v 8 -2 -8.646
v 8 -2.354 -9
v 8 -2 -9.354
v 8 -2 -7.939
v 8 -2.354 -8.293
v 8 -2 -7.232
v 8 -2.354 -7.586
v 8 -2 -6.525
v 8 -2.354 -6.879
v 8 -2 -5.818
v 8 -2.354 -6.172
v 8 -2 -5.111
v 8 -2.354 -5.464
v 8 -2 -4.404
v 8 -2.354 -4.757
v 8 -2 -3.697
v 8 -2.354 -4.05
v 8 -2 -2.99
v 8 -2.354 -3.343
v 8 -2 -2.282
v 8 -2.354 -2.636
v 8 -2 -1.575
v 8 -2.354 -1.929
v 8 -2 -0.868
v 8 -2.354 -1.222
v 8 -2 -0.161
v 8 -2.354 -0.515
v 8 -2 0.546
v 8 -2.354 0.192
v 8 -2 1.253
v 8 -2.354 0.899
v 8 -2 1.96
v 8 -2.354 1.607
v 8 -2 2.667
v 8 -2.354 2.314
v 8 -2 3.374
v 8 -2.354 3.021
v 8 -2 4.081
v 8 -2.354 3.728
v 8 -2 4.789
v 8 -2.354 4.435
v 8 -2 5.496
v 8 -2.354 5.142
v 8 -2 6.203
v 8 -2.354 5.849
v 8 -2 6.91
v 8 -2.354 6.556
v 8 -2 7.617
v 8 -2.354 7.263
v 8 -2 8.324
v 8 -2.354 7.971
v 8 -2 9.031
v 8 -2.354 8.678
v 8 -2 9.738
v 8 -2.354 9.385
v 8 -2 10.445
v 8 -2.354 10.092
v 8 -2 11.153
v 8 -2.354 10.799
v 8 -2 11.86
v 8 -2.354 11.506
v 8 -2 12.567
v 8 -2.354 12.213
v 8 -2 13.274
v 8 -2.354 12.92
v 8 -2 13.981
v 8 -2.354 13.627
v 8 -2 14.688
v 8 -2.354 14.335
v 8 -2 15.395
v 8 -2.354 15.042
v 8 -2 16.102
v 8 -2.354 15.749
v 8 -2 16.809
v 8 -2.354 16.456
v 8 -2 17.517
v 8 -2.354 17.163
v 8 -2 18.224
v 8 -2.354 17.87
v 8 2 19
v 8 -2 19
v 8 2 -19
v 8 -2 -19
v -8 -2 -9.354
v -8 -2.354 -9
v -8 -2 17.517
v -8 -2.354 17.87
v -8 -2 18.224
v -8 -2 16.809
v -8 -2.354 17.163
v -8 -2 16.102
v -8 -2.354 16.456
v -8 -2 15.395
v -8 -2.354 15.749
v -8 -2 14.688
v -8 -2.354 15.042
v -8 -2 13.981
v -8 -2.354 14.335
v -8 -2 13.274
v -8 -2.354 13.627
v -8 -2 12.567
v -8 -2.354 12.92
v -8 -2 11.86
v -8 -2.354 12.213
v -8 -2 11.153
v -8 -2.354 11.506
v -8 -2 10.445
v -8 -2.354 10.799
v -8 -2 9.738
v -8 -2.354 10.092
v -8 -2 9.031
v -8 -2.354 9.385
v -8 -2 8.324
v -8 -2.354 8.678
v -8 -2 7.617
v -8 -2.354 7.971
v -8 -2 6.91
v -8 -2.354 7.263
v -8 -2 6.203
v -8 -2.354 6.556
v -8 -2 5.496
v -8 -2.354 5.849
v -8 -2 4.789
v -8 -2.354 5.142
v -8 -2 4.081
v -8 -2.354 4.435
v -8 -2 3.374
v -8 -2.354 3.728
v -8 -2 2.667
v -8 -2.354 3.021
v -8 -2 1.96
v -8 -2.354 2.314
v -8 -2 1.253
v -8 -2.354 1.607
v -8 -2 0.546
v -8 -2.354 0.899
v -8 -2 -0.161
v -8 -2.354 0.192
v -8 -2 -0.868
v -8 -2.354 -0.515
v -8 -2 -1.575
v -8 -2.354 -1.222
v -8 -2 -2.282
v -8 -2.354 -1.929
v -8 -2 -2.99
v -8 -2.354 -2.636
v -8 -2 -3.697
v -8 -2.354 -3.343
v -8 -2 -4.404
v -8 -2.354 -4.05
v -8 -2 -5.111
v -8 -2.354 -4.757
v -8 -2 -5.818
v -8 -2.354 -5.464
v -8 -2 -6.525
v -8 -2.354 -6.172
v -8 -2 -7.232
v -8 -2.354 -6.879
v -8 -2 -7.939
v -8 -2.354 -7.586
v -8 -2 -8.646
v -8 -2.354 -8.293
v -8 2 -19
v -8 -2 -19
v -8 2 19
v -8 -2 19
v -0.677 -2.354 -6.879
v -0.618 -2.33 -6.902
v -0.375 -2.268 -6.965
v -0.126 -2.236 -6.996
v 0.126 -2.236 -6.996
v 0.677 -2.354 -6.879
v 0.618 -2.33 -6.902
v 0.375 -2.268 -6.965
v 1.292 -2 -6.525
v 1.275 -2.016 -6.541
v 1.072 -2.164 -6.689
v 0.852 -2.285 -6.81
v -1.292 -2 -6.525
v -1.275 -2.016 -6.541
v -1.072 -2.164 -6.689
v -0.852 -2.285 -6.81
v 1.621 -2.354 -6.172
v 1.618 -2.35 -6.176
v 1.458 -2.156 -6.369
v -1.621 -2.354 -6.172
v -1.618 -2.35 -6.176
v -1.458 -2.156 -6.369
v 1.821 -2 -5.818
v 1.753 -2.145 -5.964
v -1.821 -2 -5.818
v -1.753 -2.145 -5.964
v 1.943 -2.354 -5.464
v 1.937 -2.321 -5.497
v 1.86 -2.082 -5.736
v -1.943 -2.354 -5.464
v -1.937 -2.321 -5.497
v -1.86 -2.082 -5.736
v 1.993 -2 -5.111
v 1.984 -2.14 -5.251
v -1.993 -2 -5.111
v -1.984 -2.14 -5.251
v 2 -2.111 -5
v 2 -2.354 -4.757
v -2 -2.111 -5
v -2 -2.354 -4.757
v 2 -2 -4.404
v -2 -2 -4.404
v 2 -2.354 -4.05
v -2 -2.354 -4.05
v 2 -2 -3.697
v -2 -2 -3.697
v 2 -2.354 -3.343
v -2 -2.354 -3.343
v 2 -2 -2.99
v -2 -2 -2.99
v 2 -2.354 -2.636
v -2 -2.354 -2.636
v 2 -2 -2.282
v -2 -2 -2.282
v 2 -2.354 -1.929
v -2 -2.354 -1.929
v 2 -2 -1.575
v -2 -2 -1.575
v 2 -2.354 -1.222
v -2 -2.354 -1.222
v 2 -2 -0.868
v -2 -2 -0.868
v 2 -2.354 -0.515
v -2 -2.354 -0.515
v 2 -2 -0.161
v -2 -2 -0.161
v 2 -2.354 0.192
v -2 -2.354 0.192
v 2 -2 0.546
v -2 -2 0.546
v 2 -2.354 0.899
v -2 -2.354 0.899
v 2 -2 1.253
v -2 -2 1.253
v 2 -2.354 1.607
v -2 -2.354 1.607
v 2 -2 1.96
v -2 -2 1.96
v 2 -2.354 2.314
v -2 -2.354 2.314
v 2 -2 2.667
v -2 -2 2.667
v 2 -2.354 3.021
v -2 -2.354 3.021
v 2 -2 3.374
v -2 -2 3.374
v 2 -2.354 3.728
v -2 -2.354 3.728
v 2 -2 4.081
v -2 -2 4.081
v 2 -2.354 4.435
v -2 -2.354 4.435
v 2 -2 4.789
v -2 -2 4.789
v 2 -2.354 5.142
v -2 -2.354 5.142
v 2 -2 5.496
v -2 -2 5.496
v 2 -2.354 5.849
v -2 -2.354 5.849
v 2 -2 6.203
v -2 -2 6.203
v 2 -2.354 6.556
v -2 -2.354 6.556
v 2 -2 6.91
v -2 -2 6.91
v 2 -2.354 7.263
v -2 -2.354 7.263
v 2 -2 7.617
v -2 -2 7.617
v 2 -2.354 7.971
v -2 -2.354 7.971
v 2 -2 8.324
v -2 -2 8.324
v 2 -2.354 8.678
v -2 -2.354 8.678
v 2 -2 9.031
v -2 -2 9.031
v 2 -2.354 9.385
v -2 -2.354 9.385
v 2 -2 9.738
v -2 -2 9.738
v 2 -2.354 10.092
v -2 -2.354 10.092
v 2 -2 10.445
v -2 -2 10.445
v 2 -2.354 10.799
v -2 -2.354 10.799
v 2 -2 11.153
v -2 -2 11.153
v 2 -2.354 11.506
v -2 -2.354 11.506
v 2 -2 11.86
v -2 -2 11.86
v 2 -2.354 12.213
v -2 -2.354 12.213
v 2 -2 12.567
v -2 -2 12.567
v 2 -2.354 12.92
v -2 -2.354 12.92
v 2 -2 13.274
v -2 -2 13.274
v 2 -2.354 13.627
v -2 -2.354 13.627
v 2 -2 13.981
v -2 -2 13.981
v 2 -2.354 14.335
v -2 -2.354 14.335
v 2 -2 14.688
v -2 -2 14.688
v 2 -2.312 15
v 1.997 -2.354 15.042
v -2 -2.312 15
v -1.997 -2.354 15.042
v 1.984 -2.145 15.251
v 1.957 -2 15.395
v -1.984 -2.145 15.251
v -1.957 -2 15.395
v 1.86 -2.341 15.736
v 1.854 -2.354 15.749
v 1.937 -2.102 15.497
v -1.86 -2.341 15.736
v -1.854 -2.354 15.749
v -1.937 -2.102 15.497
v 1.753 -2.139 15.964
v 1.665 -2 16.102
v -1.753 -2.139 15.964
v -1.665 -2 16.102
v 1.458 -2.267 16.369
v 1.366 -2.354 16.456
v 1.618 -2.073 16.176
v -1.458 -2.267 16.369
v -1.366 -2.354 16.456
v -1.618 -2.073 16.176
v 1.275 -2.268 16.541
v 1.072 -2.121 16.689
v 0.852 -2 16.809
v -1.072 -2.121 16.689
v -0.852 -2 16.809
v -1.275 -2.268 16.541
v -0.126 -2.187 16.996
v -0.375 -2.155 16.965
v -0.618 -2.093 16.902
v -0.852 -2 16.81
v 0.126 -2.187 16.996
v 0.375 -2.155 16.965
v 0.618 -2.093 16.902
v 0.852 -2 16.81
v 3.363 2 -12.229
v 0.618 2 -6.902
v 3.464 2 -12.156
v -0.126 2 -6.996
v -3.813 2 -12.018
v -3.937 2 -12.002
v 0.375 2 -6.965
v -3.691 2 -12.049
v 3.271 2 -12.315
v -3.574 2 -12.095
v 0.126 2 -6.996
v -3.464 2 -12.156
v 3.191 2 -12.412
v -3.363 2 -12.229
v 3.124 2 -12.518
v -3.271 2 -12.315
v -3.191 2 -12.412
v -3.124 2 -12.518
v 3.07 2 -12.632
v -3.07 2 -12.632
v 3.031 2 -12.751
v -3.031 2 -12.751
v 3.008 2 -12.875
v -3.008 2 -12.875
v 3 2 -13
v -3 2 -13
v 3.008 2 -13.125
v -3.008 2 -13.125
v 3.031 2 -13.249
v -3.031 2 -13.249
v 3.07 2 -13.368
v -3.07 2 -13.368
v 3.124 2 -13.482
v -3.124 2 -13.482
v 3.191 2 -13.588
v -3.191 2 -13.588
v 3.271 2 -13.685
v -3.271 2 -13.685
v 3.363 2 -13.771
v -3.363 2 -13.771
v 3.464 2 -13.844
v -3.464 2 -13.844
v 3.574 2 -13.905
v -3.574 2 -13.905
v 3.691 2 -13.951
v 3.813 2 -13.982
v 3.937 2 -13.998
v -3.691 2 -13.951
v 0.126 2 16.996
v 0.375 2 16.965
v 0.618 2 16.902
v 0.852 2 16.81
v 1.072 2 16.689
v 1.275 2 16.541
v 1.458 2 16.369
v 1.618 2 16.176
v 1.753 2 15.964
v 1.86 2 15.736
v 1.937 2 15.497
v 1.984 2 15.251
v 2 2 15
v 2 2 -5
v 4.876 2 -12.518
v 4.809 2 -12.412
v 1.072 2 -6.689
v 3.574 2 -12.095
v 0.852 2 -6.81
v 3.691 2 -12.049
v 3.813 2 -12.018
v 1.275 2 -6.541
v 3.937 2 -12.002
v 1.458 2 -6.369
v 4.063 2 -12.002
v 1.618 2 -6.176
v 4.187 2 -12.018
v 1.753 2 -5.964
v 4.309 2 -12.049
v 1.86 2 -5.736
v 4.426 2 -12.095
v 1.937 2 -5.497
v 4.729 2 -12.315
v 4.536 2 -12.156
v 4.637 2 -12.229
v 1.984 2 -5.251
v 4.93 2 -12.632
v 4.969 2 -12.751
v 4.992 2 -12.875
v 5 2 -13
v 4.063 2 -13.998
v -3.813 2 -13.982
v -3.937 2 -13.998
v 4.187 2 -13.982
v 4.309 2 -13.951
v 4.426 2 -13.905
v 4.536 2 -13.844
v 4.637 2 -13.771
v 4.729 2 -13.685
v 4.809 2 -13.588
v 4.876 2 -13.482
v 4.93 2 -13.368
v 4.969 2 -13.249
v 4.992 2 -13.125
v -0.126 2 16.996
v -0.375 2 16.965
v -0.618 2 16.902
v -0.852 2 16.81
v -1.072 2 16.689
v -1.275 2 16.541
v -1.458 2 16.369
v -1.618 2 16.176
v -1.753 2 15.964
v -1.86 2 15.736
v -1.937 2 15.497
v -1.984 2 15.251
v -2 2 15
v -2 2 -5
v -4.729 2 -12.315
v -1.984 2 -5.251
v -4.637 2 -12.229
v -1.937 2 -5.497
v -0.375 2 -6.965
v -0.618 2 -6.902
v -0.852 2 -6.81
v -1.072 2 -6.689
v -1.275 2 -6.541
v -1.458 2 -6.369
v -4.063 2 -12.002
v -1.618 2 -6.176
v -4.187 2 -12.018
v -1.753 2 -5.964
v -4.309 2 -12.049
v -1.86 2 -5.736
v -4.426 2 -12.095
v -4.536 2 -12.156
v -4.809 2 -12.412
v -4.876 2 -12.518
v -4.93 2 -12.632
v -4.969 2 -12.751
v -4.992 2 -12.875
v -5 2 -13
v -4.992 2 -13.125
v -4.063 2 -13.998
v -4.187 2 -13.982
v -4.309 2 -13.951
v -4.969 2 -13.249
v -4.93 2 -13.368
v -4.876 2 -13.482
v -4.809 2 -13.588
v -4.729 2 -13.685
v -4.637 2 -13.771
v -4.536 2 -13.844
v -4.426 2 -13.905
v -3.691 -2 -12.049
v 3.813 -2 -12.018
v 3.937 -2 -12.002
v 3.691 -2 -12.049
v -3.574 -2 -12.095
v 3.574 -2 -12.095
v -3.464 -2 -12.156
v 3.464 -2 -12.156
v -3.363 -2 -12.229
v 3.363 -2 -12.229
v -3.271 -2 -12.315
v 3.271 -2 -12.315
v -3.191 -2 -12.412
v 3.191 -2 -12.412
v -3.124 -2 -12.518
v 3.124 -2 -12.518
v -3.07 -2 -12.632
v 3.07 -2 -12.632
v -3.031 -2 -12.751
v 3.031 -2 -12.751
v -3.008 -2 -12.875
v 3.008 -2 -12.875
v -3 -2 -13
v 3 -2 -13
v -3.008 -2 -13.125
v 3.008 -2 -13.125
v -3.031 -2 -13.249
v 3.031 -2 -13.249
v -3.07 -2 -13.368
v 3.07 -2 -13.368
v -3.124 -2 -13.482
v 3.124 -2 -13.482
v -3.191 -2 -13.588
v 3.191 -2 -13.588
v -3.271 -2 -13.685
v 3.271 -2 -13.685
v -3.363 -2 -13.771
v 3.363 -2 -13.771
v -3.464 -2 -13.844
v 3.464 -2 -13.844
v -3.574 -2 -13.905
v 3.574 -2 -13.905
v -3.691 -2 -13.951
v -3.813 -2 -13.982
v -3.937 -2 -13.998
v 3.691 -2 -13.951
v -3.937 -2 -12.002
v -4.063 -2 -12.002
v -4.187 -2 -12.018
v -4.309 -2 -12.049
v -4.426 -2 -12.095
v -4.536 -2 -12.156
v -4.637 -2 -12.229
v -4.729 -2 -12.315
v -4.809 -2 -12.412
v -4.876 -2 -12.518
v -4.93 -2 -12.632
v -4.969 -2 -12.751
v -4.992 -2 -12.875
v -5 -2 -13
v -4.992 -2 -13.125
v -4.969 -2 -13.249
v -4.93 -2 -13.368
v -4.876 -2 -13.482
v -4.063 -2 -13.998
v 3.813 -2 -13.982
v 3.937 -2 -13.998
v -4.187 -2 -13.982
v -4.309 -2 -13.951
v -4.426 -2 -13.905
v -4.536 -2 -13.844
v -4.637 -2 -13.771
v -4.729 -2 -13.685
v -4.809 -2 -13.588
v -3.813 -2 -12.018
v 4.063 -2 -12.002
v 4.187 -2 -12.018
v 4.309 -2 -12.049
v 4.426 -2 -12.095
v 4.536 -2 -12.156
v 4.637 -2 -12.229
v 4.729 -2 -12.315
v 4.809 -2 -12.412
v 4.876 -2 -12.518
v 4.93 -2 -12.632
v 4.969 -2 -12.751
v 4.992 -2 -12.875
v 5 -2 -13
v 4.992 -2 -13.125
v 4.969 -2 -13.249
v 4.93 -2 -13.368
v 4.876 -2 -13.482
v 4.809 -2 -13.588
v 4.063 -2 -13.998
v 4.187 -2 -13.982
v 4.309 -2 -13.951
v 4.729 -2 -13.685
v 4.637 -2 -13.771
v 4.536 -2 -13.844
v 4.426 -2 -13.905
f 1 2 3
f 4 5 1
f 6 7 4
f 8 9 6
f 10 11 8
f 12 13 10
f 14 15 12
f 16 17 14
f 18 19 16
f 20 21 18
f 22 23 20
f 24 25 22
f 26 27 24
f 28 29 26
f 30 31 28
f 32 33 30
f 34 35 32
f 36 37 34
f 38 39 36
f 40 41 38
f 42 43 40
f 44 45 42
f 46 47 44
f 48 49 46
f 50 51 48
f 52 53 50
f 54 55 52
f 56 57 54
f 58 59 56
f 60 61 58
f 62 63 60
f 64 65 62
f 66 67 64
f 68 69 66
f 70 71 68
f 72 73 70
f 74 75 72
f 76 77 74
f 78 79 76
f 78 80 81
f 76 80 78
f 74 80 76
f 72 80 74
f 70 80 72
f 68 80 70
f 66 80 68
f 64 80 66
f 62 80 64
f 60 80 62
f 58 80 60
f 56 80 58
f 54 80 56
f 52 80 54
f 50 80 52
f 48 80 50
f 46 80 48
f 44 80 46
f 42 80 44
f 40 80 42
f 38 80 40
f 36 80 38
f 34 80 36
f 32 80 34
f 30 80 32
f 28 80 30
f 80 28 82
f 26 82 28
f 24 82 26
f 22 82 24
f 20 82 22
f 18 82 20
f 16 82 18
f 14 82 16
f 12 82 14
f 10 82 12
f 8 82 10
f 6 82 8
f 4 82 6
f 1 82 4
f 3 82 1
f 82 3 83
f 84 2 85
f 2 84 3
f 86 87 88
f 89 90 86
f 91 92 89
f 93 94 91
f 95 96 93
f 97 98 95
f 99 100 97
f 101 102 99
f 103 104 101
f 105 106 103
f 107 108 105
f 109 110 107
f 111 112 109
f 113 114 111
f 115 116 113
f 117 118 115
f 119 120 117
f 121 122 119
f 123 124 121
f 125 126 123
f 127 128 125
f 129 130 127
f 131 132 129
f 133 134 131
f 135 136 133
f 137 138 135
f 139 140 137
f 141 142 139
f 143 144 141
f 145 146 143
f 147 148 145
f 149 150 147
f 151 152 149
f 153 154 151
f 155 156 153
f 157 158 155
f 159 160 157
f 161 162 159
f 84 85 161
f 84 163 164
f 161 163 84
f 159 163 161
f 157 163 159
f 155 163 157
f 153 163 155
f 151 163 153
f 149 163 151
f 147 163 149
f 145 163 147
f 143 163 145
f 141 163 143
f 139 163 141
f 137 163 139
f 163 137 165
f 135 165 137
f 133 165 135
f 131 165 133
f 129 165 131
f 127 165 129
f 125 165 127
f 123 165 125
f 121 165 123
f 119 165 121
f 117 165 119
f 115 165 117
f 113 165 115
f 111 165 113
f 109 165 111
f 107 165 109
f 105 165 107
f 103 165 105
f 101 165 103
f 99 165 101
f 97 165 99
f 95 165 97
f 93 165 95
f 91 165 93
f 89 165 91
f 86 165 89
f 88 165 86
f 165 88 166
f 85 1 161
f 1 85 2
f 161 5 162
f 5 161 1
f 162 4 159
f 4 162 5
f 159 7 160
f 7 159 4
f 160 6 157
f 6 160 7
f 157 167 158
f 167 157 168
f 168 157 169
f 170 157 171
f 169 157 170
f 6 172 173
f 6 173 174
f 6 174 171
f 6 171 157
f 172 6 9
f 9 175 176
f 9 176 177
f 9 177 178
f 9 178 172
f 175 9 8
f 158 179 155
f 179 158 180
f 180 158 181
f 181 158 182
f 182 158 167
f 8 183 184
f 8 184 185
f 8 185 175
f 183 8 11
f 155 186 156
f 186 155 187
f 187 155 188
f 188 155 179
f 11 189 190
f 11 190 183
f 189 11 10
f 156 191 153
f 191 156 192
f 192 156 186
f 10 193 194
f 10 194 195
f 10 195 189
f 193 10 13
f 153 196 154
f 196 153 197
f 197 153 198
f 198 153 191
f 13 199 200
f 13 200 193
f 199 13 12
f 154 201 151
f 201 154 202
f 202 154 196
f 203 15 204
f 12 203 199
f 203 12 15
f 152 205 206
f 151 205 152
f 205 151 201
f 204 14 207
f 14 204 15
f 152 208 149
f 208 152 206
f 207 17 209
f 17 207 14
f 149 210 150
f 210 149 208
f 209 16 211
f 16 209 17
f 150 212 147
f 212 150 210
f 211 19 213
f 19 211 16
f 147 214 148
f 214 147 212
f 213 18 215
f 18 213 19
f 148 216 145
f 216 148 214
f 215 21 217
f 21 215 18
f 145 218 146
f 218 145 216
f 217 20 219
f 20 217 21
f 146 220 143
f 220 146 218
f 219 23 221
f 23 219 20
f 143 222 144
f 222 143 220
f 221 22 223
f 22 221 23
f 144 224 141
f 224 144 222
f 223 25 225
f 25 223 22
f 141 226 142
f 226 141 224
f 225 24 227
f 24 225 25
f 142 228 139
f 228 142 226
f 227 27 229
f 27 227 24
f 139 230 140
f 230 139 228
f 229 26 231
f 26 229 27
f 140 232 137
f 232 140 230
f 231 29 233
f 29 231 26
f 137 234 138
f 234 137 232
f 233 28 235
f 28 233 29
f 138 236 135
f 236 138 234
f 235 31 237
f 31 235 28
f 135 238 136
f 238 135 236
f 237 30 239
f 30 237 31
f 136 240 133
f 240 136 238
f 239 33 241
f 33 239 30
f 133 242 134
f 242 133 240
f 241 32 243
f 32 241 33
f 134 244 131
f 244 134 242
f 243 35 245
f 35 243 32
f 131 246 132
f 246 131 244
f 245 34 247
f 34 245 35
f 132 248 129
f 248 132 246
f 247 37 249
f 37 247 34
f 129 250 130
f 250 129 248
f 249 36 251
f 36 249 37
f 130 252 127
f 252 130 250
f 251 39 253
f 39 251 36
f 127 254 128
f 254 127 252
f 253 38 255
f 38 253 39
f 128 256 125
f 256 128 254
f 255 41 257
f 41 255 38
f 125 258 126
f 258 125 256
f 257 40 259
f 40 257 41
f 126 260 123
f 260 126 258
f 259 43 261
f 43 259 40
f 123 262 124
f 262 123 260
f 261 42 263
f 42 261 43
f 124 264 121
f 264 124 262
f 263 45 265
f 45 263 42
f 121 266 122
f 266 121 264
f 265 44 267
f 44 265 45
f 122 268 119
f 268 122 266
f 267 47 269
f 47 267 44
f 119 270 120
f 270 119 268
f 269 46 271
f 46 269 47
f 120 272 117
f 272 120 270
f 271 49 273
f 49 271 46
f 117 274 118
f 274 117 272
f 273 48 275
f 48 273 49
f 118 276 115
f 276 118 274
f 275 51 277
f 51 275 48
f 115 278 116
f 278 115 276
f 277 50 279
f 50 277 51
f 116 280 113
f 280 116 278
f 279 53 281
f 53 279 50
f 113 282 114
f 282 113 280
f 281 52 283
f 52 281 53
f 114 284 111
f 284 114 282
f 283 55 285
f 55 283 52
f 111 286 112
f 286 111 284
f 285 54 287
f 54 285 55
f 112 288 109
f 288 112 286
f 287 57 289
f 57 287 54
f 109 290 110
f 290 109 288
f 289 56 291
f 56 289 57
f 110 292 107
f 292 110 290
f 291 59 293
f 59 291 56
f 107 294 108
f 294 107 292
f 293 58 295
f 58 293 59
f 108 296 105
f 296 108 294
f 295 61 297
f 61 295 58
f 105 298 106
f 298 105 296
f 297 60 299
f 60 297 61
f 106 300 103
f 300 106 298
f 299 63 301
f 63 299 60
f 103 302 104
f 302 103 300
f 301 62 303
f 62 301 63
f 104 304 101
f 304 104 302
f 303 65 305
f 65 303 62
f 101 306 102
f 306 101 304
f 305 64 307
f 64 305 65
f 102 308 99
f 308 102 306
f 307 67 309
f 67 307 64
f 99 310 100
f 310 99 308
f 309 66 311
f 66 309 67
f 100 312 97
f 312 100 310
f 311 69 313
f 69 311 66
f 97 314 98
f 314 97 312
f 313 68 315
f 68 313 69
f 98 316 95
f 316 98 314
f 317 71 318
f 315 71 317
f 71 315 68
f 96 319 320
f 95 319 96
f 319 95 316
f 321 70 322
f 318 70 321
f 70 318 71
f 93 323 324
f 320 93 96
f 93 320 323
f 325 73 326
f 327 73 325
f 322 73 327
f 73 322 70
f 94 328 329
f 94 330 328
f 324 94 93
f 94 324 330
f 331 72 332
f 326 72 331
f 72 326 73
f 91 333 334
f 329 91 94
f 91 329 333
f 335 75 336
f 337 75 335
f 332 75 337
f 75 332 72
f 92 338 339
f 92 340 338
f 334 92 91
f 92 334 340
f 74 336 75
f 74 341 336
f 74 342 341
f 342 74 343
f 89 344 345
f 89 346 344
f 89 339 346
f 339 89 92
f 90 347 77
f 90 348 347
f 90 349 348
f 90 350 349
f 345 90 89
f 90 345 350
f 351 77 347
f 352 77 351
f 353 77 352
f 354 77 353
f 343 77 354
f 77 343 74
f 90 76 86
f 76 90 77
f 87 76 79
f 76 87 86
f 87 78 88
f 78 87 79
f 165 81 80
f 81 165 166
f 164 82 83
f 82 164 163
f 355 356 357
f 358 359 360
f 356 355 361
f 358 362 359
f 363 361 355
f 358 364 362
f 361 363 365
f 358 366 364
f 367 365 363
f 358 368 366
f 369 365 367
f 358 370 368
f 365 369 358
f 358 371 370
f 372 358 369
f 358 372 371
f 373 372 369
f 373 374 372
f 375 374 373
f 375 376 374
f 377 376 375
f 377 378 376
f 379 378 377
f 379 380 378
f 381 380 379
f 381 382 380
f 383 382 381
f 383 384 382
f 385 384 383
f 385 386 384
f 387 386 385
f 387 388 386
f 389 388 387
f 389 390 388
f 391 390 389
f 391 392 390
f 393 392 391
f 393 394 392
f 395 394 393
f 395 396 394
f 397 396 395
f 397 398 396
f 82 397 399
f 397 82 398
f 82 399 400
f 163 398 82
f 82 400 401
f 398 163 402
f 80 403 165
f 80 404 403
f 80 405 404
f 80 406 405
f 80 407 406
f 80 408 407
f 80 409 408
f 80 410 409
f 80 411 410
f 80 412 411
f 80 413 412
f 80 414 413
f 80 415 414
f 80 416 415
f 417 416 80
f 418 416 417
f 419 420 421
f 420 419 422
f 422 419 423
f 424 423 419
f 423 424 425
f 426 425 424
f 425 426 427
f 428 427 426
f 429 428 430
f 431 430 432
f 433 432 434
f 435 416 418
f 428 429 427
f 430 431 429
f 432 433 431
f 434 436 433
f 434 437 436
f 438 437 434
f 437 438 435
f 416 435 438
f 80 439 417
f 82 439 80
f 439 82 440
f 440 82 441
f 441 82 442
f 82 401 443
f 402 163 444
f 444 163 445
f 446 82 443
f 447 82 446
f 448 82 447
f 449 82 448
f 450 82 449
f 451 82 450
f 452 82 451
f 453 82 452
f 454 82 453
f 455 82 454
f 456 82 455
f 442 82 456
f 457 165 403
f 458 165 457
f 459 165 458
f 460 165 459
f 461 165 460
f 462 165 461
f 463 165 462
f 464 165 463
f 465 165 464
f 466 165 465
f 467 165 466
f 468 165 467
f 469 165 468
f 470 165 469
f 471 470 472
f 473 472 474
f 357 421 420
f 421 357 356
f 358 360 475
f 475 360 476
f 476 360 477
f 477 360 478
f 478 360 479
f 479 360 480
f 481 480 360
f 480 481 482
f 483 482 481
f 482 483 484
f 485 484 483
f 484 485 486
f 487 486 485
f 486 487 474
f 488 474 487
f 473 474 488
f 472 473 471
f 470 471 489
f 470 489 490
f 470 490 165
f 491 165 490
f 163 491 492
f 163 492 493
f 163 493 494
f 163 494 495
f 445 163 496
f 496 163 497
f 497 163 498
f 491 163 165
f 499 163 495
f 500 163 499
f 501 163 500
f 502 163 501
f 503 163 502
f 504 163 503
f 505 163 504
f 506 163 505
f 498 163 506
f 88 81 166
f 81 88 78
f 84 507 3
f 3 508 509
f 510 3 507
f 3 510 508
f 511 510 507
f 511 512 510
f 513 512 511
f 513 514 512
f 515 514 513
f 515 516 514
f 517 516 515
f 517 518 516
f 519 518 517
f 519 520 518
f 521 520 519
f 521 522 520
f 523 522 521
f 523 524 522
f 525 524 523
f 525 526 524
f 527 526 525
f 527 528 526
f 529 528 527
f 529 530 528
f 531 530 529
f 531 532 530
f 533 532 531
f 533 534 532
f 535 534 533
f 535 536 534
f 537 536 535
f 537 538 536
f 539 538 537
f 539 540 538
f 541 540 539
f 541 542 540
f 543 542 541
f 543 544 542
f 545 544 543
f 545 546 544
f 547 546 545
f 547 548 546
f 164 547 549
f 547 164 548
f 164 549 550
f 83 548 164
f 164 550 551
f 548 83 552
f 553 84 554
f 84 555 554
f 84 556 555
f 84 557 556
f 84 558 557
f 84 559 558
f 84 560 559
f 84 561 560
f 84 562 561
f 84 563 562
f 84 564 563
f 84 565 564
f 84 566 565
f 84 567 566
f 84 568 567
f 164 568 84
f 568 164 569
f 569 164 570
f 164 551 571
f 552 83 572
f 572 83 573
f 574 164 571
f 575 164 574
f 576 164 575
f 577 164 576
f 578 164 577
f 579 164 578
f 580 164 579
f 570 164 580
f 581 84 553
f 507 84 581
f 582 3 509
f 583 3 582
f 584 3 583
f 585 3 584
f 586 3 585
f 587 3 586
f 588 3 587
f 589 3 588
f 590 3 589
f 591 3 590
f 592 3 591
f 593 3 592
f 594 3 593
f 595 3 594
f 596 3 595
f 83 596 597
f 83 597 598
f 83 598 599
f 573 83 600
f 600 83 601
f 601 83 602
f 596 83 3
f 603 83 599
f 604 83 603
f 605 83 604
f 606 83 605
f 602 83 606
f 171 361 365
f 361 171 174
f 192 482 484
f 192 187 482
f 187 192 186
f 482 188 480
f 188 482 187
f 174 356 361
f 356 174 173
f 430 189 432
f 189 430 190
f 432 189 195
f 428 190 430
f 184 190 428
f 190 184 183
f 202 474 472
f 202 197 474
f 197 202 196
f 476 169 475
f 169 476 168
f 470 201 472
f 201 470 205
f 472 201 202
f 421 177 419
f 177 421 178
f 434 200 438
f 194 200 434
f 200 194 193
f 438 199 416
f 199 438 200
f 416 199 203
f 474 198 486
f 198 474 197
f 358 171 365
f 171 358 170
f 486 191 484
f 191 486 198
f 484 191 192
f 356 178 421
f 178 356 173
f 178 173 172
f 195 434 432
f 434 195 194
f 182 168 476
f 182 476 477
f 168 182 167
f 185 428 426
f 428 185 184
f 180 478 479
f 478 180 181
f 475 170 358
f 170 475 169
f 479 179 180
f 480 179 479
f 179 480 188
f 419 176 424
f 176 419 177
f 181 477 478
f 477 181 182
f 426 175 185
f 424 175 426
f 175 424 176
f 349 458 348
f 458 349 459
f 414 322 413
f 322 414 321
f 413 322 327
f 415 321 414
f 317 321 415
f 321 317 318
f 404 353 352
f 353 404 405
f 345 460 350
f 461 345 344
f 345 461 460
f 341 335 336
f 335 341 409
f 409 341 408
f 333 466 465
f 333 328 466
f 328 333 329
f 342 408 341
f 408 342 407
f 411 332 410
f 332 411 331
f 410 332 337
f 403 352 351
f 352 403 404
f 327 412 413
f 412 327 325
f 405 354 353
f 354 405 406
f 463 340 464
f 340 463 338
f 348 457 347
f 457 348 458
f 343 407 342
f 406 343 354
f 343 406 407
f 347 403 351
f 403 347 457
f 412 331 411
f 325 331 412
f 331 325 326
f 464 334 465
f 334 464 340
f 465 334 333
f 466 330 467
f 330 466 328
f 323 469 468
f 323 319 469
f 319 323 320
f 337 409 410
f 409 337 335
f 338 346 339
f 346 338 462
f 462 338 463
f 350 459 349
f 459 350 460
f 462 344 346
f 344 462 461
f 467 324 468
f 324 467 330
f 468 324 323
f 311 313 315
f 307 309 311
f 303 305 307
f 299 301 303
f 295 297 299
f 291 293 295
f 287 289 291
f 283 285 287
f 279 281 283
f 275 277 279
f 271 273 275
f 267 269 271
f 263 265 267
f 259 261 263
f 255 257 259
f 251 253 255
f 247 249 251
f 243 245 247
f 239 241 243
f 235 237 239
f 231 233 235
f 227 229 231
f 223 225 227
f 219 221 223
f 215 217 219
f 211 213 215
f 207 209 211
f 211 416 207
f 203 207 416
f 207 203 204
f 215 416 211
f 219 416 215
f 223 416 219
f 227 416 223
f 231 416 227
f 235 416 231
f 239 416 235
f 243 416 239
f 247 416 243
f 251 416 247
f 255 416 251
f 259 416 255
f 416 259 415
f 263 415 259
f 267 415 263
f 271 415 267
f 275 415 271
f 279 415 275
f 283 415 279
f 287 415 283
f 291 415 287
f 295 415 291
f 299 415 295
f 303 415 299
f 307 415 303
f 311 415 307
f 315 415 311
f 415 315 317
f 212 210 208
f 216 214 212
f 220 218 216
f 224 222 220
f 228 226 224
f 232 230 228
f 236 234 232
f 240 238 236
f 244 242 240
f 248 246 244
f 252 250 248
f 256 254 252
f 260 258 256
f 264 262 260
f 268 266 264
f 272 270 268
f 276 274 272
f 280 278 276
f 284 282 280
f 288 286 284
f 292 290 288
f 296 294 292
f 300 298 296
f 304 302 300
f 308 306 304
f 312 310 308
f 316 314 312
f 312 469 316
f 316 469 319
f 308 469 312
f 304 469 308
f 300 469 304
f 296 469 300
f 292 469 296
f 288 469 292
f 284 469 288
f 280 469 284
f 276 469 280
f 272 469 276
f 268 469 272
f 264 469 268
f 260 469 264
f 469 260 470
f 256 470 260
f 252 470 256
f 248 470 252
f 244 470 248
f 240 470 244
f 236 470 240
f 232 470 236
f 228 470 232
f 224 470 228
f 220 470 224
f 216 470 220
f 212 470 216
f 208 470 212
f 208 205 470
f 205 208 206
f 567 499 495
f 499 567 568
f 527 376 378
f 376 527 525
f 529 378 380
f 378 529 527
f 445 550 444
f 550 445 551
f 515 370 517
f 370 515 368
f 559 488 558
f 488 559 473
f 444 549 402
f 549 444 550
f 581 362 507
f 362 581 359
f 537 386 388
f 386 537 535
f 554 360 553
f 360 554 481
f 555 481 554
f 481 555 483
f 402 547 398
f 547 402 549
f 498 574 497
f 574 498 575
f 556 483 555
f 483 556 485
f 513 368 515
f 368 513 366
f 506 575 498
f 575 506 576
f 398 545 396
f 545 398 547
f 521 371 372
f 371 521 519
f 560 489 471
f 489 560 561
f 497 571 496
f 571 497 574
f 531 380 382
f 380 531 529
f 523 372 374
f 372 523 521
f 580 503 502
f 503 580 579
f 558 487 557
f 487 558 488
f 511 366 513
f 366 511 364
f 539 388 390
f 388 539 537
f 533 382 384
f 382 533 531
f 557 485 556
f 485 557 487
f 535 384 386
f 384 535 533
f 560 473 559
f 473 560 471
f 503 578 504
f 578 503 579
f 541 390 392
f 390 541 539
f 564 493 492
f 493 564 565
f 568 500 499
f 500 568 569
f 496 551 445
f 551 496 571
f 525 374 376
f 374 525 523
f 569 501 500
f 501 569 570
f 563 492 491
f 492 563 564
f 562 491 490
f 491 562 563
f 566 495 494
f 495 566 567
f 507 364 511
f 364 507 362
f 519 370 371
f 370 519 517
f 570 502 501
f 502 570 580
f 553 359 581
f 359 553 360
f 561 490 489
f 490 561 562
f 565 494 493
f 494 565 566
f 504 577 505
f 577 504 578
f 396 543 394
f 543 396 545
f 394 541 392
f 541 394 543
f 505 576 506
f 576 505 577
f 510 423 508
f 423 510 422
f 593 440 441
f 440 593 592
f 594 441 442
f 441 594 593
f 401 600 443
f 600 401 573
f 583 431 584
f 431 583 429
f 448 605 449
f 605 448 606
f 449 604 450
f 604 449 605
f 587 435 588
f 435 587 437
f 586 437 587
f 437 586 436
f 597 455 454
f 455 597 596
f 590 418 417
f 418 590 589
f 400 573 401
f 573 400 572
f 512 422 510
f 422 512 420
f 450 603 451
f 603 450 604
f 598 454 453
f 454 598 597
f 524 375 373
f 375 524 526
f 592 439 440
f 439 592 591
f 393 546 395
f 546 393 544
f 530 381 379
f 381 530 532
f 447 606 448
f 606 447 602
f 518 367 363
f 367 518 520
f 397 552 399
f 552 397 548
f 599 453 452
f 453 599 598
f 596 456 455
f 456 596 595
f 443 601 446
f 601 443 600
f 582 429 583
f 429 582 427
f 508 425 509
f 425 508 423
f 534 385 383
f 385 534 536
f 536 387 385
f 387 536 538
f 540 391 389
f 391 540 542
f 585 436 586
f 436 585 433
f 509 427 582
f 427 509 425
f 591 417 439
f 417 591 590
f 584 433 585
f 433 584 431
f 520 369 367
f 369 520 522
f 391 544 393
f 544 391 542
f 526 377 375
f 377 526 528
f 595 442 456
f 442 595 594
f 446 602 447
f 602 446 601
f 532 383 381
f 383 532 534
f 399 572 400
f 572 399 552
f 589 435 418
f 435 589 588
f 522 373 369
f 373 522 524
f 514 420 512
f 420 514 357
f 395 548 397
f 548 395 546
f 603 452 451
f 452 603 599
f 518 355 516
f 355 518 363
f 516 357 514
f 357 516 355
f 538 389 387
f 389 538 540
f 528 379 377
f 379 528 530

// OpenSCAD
// file: serrated45_plane.scad
// serration using cubes




module serrated45_plane (pitch, length, width) {
    union () {
        for(i = [0:(length - 1)]) {
            translate([i * cos(45), 0, 0])
            rotate([0,0,45])
            cube( [pitch, pitch, width], center = true);
        }
    }
    {
        plane_length = pitch * cos(45) * 2 * length;
        translate([plane_length/2, - pitch/2 * 0.95, 0])
        cube([plane_length, pitch/2, width], center = true);
    }
}


// serrated45_plane (0.5, 80, 18);
// main file
include <serrated45_plane.scad>;

// GPU brace - Female
//           - Bottom half
// printing - solid
// precision - 0.06



base_thickness = 4;

male_x = 16;
male_y = 4;
male_z = 34 + base_thickness;    // add 4mm to go through the base

flange_x = 2;
flange_y = 8;
flange_z = male_z;

// mounting to base
mounting_screw_dia = 2;
mounting_screw_length = 10;
mounting_washer_dia = 5;
mounting_screw_head_dia = 4;

// M4 mating - serration 
mating_screw_dia = 4;
mating_screw_pilot = 3.3;
mating_washer_dia = 9;

// slot
slot = 2;
mate_1_cl = 12 - slot;
mate_2_cl = 28 + slot;

$fn = 50;



difference () {
    {
    union () {

        
        // flanges

        
        // center

        cube([male_x,male_y, male_z], center = true);        
        
        // serration
        translate([0, -male_y/2, -male_z/2 + base_thickness + 6])
        rotate([180,-90,0])
        serrated45_plane(0.5, 39, male_x);
        }
    }
    {

    // serrated mating holes
    translate([0, male_y/2 - 3, -male_z/2 + base_thickness + mate_1_cl])
    rotate([90,0,0])
    cylinder(r = mating_screw_dia/2, h = 6, center = true);
        
    translate([0, male_y/2 - 3, -male_z/2 + base_thickness + mate_2_cl])
    rotate([90,0,0])
    cylinder(r = mating_screw_dia /2, h = 6, center = true);
    

        
    // slot
    translate([0, male_y/2 - 3, -male_z/2 + base_thickness + (mate_2_cl - mate_1_cl)/2 + mate_1_cl])
    cube([mating_screw_dia, male_y + 2, mate_2_cl - mate_1_cl], center = true);        
        
    // mounting screws to base
    translate([-male_x/4, male_y/2 - 3, -male_z/2 + base_thickness + 2])
    rotate([90,0,0])
    cylinder(r = mounting_screw_dia/2, h = 6, center = true);
        
    translate([male_x/4, male_y/2 - 3, -male_z/2 + base_thickness + 2])
    rotate([90,0,0])
    cylinder(r = mounting_screw_dia/2, h = 6, center = true);    
    }
}
